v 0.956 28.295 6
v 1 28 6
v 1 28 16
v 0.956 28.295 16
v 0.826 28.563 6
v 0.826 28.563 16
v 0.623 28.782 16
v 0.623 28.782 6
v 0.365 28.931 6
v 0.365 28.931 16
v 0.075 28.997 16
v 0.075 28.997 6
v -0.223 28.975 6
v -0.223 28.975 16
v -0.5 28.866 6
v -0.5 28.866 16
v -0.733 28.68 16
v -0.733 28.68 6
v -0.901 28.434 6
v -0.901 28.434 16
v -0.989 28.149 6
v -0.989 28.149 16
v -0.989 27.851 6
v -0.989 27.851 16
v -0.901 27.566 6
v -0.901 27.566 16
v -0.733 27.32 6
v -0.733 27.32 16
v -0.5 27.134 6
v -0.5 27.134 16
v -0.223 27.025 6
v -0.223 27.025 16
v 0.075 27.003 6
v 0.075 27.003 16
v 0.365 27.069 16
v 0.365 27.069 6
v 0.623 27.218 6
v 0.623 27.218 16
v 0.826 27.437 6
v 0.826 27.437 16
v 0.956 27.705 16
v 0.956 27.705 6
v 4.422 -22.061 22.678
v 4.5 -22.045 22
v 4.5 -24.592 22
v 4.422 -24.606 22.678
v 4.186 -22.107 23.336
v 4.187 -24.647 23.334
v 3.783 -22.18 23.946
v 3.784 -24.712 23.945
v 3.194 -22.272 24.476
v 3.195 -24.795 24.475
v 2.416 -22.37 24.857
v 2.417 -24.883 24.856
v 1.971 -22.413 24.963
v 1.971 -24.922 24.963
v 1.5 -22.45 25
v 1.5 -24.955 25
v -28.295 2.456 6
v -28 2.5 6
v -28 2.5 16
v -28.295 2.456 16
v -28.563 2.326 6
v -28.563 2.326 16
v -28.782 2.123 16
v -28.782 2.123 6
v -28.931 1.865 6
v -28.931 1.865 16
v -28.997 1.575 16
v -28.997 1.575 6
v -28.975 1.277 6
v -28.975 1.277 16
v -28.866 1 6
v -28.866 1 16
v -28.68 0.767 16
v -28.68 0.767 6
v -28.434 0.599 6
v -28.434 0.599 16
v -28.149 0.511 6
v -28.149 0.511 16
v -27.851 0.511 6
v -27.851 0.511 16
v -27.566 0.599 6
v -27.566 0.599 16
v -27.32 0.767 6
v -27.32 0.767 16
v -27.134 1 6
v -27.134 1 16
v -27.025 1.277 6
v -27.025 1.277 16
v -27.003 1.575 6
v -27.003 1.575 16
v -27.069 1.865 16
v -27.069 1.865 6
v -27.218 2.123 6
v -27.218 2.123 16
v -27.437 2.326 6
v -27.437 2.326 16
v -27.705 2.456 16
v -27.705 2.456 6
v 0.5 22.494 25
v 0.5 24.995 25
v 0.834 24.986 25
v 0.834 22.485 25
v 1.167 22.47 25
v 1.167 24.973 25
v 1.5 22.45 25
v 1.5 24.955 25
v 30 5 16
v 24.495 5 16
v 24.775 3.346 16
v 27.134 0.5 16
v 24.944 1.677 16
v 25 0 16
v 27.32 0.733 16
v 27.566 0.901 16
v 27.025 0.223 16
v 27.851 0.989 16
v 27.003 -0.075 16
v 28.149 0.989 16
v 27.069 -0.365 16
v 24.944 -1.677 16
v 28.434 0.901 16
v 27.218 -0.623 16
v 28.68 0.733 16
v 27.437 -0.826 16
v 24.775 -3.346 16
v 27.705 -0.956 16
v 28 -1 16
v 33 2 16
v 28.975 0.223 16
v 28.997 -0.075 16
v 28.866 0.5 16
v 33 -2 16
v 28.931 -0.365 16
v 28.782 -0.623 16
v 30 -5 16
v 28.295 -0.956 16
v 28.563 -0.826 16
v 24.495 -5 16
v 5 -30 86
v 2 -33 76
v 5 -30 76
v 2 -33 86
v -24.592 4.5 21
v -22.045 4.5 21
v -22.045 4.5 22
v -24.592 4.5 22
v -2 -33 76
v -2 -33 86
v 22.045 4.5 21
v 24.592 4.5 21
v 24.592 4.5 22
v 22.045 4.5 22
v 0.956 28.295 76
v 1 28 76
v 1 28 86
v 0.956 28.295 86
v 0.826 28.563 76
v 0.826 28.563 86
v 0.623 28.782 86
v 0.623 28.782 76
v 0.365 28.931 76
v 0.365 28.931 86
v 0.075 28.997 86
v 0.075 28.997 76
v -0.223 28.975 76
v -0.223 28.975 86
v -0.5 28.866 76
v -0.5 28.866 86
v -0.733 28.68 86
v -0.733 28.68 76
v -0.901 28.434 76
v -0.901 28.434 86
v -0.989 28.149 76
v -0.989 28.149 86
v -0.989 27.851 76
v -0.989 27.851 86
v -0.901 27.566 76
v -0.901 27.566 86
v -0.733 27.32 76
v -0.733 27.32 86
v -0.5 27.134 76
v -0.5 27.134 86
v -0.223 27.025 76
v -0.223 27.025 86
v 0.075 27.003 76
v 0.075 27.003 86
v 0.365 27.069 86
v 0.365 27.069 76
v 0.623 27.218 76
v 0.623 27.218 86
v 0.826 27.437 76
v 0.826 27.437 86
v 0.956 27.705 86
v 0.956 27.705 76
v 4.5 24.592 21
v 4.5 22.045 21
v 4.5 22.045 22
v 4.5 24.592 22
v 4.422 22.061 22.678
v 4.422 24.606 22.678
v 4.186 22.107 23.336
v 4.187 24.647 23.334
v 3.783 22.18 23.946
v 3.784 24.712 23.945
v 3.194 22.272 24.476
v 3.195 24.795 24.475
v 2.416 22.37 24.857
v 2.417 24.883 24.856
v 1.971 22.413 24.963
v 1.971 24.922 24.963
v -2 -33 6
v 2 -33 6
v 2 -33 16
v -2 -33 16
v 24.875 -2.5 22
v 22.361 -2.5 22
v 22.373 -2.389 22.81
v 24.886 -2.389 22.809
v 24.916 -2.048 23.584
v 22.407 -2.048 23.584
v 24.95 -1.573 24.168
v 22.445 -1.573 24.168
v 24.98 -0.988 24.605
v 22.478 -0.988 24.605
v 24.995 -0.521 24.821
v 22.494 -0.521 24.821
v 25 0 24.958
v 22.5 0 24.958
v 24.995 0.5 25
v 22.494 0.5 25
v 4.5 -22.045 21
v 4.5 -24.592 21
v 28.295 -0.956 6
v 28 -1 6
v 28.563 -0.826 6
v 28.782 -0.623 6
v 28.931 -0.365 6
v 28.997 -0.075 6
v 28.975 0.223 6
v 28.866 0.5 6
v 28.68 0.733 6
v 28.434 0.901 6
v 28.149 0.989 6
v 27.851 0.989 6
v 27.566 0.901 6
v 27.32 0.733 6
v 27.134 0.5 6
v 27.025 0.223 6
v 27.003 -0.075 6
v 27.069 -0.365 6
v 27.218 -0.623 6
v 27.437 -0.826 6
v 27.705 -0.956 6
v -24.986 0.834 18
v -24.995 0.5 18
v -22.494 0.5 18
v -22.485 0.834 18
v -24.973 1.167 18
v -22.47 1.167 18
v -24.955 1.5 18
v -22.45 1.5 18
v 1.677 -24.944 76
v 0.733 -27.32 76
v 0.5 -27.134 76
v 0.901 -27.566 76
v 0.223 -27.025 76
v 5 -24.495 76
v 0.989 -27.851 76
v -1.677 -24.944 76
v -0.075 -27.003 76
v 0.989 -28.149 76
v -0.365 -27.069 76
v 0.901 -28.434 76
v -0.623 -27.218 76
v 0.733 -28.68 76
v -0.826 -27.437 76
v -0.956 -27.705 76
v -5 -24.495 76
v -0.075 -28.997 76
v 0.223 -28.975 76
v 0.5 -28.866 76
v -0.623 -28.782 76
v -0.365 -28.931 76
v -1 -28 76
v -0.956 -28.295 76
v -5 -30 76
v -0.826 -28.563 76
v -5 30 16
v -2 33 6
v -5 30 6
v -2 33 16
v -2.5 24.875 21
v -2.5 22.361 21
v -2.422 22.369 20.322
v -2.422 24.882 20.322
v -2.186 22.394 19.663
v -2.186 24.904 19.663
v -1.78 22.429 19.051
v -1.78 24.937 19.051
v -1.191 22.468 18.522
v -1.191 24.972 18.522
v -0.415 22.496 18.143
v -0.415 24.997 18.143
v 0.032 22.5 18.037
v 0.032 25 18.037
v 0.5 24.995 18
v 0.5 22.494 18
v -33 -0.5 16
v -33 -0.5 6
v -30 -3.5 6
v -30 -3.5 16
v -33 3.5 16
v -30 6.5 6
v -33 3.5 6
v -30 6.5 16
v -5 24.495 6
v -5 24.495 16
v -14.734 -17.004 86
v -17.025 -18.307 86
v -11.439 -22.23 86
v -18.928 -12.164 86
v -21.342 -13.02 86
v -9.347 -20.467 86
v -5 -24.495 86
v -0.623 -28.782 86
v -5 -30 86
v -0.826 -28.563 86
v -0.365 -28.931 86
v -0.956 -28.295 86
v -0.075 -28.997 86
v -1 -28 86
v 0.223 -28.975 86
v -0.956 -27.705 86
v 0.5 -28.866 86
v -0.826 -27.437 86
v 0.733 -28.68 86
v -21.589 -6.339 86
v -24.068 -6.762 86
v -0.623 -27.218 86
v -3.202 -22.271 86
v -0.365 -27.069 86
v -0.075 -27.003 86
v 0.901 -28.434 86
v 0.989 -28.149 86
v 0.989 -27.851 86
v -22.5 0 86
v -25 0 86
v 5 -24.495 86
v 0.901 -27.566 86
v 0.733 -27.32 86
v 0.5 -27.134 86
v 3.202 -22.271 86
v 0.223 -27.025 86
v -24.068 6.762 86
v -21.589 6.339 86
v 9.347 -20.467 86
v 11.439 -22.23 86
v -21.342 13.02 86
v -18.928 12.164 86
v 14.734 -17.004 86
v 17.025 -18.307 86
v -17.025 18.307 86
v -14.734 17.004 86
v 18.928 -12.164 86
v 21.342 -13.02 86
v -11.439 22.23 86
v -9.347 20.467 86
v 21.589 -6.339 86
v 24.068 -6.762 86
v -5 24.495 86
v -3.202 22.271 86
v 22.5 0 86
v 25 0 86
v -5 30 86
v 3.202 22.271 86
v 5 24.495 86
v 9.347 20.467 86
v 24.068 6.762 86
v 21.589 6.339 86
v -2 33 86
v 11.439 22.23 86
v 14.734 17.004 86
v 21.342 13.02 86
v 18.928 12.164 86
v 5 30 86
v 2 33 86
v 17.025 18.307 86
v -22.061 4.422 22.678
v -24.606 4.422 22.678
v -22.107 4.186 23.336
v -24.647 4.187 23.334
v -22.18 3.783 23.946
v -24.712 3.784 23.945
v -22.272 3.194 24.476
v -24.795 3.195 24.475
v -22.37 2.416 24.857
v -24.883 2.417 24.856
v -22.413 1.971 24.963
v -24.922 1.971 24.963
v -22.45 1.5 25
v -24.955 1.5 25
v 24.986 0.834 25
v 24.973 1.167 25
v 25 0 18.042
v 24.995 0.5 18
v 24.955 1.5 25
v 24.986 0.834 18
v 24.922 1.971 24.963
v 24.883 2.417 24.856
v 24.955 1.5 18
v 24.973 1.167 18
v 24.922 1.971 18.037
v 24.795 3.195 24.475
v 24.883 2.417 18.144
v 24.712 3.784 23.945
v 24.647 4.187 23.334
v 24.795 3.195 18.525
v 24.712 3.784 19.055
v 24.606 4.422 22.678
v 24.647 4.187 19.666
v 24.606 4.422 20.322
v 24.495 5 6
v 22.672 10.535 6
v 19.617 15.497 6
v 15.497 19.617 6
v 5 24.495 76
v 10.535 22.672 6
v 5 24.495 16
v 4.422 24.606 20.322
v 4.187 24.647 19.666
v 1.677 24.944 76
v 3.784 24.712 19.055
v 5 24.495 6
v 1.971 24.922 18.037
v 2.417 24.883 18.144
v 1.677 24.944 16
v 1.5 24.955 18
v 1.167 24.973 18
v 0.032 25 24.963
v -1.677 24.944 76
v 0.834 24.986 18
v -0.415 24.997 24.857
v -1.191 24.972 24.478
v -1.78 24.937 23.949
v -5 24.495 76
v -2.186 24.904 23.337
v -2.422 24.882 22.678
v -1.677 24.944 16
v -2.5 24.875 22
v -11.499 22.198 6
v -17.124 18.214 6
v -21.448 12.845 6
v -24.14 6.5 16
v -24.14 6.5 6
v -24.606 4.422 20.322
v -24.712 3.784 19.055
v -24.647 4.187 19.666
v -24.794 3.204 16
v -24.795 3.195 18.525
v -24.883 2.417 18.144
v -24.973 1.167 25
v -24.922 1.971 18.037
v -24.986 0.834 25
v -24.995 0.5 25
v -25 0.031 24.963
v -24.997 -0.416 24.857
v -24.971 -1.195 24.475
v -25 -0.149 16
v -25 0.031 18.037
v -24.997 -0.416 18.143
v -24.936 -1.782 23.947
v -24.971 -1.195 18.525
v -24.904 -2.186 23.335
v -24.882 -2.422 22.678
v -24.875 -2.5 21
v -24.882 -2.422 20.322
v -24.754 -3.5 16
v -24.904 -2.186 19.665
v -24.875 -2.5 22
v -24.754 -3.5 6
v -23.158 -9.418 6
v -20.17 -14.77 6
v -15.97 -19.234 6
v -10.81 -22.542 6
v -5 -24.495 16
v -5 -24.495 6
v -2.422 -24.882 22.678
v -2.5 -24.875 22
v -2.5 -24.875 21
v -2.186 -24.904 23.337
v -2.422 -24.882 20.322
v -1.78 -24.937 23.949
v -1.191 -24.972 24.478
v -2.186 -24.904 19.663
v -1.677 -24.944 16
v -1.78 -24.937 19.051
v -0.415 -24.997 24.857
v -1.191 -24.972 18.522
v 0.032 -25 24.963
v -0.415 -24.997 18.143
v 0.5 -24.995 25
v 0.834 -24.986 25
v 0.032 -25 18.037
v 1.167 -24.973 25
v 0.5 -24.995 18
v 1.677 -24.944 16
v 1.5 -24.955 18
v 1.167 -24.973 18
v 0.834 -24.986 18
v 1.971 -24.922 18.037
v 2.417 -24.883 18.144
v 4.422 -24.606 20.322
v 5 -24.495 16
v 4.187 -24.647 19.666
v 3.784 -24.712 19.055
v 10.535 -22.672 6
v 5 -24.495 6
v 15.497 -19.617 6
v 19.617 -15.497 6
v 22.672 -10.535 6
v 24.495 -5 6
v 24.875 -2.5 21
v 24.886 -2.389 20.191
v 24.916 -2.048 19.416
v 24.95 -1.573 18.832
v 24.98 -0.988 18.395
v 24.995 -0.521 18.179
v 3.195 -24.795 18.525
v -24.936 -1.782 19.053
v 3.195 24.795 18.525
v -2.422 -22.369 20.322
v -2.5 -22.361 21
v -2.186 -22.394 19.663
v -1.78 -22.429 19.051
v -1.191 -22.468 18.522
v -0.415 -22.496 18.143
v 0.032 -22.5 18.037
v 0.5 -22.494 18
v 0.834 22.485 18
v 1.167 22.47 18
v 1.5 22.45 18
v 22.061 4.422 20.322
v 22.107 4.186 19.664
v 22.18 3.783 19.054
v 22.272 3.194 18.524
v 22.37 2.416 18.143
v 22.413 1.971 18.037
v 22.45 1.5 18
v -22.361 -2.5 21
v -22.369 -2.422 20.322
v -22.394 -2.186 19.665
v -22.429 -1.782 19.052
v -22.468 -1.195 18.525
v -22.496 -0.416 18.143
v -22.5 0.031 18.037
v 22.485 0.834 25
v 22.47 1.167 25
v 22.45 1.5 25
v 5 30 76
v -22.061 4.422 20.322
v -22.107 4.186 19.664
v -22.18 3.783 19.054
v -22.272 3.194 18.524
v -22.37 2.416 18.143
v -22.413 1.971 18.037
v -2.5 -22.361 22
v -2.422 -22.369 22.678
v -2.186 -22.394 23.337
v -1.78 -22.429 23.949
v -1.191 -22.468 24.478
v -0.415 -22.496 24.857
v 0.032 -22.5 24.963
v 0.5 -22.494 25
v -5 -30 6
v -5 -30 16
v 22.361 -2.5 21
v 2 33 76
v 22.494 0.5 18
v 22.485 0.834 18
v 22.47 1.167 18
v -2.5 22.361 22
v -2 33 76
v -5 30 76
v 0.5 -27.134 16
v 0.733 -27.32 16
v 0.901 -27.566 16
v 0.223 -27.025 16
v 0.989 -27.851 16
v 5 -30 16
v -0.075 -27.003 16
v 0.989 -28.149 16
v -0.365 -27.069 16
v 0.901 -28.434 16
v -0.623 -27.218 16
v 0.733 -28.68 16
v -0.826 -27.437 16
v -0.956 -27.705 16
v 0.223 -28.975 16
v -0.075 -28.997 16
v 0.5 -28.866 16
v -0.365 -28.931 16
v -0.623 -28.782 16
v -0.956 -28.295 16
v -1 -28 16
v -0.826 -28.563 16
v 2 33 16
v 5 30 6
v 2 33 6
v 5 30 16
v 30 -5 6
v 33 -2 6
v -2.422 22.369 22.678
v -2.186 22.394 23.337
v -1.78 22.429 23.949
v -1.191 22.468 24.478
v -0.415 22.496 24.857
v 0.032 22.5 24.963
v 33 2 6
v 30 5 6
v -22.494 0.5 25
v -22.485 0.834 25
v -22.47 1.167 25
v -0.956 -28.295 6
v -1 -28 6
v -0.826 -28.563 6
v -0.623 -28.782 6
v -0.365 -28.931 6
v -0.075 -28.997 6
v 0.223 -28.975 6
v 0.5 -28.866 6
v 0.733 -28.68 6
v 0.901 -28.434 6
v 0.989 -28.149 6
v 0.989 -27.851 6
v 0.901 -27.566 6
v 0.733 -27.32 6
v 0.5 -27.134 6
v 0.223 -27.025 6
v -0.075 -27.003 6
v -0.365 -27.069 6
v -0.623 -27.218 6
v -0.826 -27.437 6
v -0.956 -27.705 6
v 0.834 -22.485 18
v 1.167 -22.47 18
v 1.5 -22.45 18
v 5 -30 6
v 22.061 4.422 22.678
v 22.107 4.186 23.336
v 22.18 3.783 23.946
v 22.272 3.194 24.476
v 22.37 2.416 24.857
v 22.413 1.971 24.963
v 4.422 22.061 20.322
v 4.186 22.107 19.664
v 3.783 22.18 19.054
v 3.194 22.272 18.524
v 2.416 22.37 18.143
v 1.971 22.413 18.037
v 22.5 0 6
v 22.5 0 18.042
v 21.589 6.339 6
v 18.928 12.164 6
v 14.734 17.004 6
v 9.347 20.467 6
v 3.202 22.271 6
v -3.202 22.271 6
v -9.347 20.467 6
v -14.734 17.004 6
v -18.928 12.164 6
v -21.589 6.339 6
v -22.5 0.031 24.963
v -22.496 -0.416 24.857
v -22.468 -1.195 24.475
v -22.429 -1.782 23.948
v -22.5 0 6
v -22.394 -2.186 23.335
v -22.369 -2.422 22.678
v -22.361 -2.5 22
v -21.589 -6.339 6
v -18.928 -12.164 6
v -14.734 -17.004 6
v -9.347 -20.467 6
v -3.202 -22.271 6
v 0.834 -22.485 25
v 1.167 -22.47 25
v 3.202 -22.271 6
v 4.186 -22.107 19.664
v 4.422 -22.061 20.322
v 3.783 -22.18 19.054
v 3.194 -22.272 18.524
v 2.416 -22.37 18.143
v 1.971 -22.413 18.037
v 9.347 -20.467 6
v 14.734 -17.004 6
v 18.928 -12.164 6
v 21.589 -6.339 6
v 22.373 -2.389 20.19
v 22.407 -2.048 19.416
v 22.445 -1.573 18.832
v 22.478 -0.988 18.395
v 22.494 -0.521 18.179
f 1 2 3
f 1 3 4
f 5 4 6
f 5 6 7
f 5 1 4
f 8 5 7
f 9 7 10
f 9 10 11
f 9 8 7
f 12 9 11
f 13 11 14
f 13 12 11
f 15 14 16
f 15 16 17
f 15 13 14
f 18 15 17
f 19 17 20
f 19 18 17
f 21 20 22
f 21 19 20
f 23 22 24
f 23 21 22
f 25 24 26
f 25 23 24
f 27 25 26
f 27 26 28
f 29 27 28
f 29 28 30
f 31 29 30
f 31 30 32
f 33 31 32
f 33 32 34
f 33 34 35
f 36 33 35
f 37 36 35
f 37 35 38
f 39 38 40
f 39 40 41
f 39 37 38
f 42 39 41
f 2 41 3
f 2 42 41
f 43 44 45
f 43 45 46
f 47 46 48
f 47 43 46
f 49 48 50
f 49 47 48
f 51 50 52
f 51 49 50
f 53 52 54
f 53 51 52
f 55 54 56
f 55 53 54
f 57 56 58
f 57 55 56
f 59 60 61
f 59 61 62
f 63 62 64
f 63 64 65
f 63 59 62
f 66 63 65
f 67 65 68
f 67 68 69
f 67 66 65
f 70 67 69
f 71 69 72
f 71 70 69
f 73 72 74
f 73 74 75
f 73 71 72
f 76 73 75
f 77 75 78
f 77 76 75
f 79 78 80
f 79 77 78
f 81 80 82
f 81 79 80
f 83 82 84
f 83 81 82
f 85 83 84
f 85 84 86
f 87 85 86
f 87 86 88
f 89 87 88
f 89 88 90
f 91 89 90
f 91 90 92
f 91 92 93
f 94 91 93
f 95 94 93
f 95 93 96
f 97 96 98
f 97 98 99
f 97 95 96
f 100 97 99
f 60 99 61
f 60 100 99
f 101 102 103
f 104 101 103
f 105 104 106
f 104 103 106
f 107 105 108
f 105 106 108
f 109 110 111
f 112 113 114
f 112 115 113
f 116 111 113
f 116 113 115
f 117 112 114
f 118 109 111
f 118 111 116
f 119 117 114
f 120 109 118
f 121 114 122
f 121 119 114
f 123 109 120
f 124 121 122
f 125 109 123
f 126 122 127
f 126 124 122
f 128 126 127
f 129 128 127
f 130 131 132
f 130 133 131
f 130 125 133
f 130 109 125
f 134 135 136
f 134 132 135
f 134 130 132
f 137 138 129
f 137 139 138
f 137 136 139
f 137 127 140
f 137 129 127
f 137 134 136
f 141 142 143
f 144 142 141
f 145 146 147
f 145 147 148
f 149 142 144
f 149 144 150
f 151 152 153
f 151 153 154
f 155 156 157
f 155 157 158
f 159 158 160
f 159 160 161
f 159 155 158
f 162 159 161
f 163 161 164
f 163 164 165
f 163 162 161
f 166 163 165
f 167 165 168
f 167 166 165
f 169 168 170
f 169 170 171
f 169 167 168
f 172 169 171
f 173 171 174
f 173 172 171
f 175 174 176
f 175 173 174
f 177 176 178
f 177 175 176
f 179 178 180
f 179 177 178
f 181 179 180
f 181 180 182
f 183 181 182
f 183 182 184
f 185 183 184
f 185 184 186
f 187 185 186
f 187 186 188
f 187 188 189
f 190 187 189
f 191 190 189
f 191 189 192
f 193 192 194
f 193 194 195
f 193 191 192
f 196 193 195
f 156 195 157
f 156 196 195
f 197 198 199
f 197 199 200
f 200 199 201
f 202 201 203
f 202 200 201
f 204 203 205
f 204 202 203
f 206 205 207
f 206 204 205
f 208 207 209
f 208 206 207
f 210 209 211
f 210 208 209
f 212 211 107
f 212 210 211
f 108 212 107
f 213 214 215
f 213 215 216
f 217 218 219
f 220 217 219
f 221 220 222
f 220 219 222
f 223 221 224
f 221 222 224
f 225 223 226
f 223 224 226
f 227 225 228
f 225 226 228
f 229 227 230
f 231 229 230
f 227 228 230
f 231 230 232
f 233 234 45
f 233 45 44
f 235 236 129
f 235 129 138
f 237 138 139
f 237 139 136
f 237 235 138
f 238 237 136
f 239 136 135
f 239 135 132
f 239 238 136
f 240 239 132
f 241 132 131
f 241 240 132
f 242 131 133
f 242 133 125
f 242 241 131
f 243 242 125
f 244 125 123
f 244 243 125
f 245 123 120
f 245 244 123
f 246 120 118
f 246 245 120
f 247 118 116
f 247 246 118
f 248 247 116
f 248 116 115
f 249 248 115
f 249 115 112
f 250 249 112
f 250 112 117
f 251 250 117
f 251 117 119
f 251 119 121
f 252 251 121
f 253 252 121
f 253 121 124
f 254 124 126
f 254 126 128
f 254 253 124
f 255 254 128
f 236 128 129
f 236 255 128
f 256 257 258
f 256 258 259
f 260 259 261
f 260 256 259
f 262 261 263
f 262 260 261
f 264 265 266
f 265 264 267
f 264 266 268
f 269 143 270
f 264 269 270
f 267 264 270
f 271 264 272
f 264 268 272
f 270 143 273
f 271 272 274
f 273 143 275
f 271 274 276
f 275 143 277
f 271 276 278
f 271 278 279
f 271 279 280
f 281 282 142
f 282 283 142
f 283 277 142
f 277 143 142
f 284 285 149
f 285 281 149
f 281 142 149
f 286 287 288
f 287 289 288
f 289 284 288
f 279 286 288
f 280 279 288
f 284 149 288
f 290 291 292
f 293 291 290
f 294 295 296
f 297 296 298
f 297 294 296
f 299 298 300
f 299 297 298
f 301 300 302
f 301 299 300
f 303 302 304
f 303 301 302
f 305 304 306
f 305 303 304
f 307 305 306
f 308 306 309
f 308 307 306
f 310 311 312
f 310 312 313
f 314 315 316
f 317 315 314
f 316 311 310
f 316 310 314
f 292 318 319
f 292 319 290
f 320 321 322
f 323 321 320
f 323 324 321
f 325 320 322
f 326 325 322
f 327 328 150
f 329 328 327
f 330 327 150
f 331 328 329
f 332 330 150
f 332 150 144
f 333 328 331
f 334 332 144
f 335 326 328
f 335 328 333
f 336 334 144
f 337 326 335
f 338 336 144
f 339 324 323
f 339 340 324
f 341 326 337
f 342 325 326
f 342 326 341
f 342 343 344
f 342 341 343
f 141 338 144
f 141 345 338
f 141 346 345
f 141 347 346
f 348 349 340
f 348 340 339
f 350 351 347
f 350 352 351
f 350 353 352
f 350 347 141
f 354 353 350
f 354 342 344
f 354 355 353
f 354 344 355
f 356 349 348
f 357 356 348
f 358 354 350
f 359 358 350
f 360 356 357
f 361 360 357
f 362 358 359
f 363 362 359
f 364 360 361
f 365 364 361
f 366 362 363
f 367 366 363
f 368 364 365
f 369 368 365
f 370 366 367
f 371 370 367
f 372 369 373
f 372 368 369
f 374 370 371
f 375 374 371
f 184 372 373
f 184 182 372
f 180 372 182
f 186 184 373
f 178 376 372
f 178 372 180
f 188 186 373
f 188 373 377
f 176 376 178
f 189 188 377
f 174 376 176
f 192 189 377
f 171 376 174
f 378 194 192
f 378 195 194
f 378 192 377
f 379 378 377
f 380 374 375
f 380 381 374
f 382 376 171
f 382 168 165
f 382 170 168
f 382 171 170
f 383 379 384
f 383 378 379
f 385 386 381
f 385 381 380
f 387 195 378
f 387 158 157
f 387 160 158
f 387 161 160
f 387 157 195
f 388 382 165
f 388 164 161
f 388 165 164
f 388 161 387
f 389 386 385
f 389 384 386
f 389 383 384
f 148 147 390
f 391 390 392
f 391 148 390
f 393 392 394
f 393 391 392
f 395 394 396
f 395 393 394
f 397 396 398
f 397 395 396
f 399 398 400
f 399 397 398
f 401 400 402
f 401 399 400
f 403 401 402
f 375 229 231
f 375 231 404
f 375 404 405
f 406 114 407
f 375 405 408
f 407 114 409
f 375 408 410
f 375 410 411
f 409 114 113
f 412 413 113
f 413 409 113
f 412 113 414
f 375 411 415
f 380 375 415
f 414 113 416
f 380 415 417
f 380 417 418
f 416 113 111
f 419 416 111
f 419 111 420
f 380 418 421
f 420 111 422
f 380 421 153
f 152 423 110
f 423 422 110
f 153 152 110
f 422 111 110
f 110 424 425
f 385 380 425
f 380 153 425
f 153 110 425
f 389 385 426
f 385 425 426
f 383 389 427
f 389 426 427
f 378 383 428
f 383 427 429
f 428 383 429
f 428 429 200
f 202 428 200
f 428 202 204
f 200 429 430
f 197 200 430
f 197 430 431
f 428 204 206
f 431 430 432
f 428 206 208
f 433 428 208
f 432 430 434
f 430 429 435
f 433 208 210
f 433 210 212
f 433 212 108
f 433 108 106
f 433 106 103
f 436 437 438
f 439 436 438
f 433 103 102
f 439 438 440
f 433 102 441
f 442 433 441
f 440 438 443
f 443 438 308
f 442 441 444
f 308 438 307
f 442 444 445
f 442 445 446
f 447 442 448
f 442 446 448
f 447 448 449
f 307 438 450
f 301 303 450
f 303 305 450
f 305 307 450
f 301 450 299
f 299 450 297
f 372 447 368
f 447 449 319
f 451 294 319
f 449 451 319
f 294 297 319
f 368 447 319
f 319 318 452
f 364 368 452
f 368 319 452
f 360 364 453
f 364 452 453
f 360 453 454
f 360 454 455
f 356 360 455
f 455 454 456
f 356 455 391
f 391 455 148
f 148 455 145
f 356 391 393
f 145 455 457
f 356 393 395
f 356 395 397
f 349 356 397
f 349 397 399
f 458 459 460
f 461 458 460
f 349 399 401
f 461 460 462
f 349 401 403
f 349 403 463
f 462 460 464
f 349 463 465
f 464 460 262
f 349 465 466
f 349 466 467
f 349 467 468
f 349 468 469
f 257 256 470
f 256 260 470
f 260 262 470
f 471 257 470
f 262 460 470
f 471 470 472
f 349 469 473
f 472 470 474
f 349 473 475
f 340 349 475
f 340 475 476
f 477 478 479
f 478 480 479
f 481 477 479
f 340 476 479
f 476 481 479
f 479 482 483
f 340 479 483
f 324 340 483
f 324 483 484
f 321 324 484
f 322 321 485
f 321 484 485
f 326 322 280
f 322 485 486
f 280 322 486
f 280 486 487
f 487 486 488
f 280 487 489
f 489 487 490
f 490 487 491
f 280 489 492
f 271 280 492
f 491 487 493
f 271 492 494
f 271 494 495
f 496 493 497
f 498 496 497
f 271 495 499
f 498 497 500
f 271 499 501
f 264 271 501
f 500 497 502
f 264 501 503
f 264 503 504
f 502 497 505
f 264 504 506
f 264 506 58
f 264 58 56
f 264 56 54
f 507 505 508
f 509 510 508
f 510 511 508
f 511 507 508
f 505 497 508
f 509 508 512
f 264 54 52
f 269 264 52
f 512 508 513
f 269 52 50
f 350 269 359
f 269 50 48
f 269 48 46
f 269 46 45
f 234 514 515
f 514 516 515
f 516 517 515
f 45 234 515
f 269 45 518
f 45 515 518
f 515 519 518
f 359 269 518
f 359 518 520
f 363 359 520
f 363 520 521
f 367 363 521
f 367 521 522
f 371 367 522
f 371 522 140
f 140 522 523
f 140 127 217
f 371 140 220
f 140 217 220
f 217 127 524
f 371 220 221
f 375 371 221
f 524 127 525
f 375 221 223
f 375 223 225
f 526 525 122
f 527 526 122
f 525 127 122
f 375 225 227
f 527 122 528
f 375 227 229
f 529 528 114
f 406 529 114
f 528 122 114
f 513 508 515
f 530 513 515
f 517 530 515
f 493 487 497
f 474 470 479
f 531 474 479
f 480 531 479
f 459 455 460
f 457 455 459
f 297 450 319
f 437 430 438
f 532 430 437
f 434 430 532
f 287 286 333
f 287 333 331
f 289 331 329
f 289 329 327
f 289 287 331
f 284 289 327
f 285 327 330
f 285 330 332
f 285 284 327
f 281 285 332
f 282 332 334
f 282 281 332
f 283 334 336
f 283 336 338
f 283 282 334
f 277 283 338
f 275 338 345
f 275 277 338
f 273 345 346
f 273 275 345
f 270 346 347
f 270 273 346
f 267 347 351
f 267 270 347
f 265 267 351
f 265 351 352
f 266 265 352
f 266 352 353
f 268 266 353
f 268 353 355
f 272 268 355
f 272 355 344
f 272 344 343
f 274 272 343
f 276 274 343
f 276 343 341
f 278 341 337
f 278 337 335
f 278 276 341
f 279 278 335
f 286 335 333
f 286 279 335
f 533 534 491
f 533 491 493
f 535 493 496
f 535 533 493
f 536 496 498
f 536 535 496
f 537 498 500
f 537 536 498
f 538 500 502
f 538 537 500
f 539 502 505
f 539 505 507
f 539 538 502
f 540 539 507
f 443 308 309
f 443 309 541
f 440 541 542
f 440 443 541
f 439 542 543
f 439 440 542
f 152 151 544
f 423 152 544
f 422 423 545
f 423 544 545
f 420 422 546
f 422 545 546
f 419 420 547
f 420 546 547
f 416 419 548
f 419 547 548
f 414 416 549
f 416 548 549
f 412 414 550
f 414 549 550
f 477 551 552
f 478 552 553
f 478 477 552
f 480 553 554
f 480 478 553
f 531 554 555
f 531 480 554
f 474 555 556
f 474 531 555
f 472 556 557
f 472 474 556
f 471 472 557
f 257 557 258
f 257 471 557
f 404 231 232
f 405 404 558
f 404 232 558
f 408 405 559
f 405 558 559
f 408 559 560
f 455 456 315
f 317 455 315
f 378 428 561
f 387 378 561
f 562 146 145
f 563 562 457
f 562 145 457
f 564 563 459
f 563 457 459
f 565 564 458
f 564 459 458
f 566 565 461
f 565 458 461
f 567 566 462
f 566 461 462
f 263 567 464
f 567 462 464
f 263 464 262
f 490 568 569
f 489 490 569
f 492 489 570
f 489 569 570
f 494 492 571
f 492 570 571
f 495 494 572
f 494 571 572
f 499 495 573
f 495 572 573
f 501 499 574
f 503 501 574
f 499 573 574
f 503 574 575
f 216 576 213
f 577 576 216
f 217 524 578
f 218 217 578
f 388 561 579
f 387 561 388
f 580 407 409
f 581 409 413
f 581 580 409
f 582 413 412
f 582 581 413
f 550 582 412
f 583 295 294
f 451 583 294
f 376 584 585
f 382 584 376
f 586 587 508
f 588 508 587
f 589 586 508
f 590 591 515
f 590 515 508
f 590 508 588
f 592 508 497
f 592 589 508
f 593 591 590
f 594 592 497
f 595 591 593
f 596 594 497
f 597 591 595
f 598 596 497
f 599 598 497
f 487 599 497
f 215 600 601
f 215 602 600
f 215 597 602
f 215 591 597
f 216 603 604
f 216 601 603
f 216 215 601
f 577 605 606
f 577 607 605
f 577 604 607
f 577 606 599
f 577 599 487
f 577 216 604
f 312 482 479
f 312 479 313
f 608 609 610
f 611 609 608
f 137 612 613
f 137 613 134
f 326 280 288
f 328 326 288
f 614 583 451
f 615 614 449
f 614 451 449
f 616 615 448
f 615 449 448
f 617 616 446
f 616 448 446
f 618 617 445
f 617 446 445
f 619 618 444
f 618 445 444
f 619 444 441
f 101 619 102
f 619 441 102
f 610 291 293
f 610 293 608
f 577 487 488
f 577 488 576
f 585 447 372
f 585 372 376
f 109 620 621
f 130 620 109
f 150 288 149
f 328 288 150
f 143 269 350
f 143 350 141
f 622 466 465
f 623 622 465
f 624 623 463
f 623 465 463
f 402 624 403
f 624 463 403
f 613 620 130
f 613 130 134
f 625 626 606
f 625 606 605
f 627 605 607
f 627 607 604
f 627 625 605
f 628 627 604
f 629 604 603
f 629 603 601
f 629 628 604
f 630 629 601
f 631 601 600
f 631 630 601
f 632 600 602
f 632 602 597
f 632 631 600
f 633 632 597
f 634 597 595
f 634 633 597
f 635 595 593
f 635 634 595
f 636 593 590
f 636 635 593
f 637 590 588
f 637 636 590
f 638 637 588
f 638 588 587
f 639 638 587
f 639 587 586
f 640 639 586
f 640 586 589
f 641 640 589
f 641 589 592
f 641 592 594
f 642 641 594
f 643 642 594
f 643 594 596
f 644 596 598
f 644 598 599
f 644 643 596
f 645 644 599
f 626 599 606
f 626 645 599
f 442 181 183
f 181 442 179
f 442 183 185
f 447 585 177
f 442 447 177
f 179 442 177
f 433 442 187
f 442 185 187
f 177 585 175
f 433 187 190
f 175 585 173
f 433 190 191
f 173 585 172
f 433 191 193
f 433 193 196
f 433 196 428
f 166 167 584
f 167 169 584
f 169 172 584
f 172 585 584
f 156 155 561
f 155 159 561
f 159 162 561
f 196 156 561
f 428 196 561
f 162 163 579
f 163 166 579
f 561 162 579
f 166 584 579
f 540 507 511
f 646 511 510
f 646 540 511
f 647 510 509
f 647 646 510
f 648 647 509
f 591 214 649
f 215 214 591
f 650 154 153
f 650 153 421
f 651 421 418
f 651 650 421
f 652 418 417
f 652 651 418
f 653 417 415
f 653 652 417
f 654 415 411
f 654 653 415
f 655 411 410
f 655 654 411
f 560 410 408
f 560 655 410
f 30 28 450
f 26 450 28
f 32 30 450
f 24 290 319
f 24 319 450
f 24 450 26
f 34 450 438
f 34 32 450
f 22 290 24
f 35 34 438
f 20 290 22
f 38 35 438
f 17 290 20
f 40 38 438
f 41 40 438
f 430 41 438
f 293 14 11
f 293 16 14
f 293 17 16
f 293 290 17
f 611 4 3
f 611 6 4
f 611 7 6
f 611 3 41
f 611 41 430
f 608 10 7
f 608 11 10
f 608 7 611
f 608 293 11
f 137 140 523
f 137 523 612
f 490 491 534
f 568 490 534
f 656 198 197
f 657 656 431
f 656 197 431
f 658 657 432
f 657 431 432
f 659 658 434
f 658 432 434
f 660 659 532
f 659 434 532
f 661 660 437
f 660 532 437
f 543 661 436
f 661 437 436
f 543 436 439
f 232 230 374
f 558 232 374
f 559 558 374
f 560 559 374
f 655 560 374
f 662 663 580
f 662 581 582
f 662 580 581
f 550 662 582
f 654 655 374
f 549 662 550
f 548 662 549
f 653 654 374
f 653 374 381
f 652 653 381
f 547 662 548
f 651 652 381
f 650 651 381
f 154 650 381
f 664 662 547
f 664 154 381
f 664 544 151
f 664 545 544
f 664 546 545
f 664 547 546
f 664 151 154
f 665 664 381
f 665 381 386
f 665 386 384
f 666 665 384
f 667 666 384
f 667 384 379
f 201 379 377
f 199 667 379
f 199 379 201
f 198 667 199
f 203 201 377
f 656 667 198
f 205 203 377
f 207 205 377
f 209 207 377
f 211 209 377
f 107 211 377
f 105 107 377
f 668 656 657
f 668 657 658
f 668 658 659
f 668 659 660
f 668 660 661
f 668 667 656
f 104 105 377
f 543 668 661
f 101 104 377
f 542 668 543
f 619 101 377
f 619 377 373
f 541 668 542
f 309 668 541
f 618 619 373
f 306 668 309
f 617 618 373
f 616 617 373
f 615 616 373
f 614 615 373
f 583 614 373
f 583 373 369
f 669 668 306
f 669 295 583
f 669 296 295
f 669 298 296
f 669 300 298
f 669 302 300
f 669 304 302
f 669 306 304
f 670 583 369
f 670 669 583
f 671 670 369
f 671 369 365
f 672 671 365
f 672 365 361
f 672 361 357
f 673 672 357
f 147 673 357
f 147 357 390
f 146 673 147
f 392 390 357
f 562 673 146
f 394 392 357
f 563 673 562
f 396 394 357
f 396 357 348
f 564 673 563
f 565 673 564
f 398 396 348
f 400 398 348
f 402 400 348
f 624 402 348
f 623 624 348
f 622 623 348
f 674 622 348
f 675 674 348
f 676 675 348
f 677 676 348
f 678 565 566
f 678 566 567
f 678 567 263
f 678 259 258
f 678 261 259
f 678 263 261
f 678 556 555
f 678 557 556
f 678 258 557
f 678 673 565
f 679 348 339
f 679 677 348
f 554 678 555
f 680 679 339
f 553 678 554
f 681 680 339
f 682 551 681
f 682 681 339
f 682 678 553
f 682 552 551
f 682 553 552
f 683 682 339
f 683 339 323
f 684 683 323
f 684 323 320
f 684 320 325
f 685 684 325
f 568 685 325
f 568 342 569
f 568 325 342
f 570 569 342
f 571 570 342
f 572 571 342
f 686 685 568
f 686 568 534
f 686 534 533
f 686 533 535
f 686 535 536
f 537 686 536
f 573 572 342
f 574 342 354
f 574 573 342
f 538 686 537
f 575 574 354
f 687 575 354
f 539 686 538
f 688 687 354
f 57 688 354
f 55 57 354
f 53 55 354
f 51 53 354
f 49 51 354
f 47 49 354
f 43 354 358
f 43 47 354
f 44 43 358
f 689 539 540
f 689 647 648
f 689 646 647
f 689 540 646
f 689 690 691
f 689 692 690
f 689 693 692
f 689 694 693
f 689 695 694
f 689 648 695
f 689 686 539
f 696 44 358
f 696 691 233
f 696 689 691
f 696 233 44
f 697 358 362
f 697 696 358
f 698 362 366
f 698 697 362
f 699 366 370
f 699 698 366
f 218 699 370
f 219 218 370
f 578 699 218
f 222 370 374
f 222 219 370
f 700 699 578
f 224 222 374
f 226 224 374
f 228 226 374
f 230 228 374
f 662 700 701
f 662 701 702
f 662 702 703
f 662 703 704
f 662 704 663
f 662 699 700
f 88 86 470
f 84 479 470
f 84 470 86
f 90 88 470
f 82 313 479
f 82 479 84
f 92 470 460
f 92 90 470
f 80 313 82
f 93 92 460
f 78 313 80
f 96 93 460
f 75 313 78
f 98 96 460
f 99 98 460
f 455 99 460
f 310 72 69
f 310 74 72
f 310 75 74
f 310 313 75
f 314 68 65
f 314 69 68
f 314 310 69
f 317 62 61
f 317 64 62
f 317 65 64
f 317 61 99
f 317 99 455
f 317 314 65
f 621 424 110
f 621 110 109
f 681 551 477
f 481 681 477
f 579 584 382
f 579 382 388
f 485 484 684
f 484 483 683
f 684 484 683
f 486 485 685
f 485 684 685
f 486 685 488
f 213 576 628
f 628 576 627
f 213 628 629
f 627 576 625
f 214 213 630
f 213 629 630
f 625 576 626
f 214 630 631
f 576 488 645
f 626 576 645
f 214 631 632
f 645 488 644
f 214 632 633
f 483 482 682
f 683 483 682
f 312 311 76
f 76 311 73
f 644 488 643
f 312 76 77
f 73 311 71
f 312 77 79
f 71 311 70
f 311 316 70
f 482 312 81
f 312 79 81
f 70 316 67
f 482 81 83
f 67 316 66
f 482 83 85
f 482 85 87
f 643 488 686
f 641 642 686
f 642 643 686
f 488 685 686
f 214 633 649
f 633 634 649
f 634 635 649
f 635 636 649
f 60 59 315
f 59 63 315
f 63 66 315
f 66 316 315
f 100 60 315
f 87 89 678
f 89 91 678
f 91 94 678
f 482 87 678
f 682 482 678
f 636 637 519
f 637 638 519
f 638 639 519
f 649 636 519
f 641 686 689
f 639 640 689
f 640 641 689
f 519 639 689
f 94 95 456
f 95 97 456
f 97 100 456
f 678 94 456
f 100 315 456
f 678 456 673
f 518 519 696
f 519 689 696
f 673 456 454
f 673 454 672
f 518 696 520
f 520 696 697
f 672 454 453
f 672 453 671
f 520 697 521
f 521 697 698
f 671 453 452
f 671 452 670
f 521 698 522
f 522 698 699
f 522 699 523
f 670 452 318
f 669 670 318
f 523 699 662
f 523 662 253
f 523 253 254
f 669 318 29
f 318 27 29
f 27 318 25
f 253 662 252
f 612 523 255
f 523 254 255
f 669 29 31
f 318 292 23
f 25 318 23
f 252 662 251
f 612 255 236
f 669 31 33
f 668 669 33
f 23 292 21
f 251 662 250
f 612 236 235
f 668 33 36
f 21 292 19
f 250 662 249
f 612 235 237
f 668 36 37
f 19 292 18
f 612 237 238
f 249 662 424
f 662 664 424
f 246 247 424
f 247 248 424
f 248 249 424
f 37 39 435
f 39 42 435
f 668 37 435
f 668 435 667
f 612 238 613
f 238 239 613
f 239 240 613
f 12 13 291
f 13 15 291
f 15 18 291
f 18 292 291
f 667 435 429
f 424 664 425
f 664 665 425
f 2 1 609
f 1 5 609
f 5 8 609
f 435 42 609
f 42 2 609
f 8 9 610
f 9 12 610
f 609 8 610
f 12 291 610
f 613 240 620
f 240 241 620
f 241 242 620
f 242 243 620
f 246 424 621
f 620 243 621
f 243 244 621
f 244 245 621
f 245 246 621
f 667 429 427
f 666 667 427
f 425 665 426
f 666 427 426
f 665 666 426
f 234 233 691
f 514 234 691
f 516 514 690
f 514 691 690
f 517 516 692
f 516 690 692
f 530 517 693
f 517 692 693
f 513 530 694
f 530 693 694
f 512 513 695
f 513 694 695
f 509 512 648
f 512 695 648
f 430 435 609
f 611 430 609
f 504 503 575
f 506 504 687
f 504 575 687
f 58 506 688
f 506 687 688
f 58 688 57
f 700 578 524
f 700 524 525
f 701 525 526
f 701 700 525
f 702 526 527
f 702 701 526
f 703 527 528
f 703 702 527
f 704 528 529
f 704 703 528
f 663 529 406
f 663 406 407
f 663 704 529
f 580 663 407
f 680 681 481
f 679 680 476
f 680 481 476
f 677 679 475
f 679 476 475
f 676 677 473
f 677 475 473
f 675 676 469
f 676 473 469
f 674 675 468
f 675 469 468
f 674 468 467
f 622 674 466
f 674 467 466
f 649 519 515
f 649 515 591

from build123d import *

# Parameters (mm, degrees)
CYLINDER019_R              = 1
CYLINDER019_DEPTH          = 10
BOX007_W                   = 10
BOX007_H                   = 10
BOX007_DEPTH               = 10
CHAMFER004_SIZE            = 3
CHAMFER004_PLACEMENT_ANGLE = -90
CYLINDER015_R              = 1
CYLINDER015_DEPTH          = 10
BOX002_W                   = 10
BOX002_H                   = 10
BOX002_DEPTH               = 10
CHAMFER_SIZE               = 3
CYLINDER017_R              = 1
CYLINDER017_DEPTH          = 10
BOX005_W                   = 10
BOX005_H                   = 10
BOX005_DEPTH               = 10
CHAMFER002_SIZE            = 3
CYLINDER018_R              = 1
CYLINDER018_DEPTH          = 10
BOX006_W                   = 10
BOX006_H                   = 10
BOX006_DEPTH               = 10
CHAMFER003_SIZE            = 3
CHAMFER003_PLACEMENT_ANGLE = 90
CYLINDER020_R              = 1
CYLINDER020_DEPTH          = 10
BOX008_W                   = 10
BOX008_H                   = 10
BOX008_DEPTH               = 10
CHAMFER005_SIZE            = 3
CHAMFER005_PLACEMENT_ANGLE = 180
CYLINDER_R                 = 1
CYLINDER_DEPTH             = 10
BOX004_W                   = 10
BOX004_H                   = 10
BOX004_DEPTH               = 10
CHAMFER001_SIZE            = 3
CHAMFER001_PLACEMENT_ANGLE = 180
BOX001_W                   = 7
BOX001_H                   = 120
BOX001_DEPTH               = 7
BOX001_PLACEMENT_ANGLE     = 90
FILLET_R                   = 3
BOX_W                      = 7
BOX_H                      = 120
BOX_DEPTH                  = 7
FILLET001_R                = 3
CYLINDER009_R              = 22.5
CYLINDER009_DEPTH          = 80
CYLINDER008_R              = 25
CYLINDER008_DEPTH          = 80


with BuildPart() as cylindre020:
    # Cylinder019 → Cylinder019 (new body)
    with BuildSketch(Plane(origin=(5, 5, 0), x_dir=(1, 0, 0), z_dir=(0, 0, 1))):
        Circle(CYLINDER019_R)
    extrude(amount=CYLINDER019_DEPTH)


with BuildPart() as chamfer004:
    # Box007 → Box007 (new body)
    with BuildSketch(Plane.XY):
        with Locations((5, 5)):
            Rectangle(BOX007_W, BOX007_H)
    extrude(amount=BOX007_DEPTH)

    # Cut018: cut Cylindre020
    add(cylindre020.part, mode=Mode.SUBTRACT)


with BuildPart() as chamfer004_1:
    # Cut018 placement: moved
    add(chamfer004.part.moved(Location((-5, 48, 70))))

    # Chamfer004
    chamfer004_edges = [chamfer004_1.edges().sort_by_distance(p)[0] for p in [
        (-5, 58, 75),
        (5, 58, 75),
    ]]
    chamfer(chamfer004_edges, length=CHAMFER004_SIZE)


with BuildPart() as chamfer004_2:
    # Chamfer004 placement: moved
    add(chamfer004_1.part.moved(Location((-25, 0, -70))).rotate(Axis((-25, 0, -70), (0, 0, 1)), CHAMFER004_PLACEMENT_ANGLE))


with BuildPart() as cylindre:
    # Cylinder015 → Cylinder015 (new body)
    with BuildSketch(Plane(origin=(5, 5, 0), x_dir=(1, 0, 0), z_dir=(0, 0, 1))):
        Circle(CYLINDER015_R)
    extrude(amount=CYLINDER015_DEPTH)


with BuildPart() as chamfer_body:
    # Box002 → Box002 (new body)
    with BuildSketch(Plane.XY):
        with Locations((5, 5)):
            Rectangle(BOX002_W, BOX002_H)
    extrude(amount=BOX002_DEPTH)

    # Cut014: cut Cylindre
    add(cylindre.part, mode=Mode.SUBTRACT)


with BuildPart() as chamfer_body_1:
    # Cut014 placement: moved
    add(chamfer_body.part.moved(Location((-5, 48, 70))))

    # Chamfer
    chamfer_edges = [chamfer_body_1.edges().sort_by_distance(p)[0] for p in [
        (-5, 58, 75),
        (5, 58, 75),
    ]]
    chamfer(chamfer_edges, length=CHAMFER_SIZE)


with BuildPart() as chamfer_body_2:
    # Chamfer placement: moved
    add(chamfer_body_1.part.moved(Location((0, -25, 0))))


with BuildPart() as cylindre018:
    # Cylinder017 → Cylinder017 (new body)
    with BuildSketch(Plane(origin=(5, 5, 0), x_dir=(1, 0, 0), z_dir=(0, 0, 1))):
        Circle(CYLINDER017_R)
    extrude(amount=CYLINDER017_DEPTH)


with BuildPart() as chamfer002:
    # Box005 → Box005 (new body)
    with BuildSketch(Plane.XY):
        with Locations((5, 5)):
            Rectangle(BOX005_W, BOX005_H)
    extrude(amount=BOX005_DEPTH)

    # Cut016: cut Cylindre018
    add(cylindre018.part, mode=Mode.SUBTRACT)


with BuildPart() as chamfer002_1:
    # Cut016 placement: moved
    add(chamfer002.part.moved(Location((-5, 48, 70))))

    # Chamfer002
    chamfer002_edges = [chamfer002_1.edges().sort_by_distance(p)[0] for p in [
        (-5, 58, 75),
        (5, 58, 75),
    ]]
    chamfer(chamfer002_edges, length=CHAMFER002_SIZE)


with BuildPart() as chamfer002_2:
    # Chamfer002 placement: moved
    add(chamfer002_1.part.moved(Location((0, -25, -70))))


with BuildPart() as cylindre019:
    # Cylinder018 → Cylinder018 (new body)
    with BuildSketch(Plane(origin=(5, 5, 0), x_dir=(1, 0, 0), z_dir=(0, 0, 1))):
        Circle(CYLINDER018_R)
    extrude(amount=CYLINDER018_DEPTH)


with BuildPart() as chamfer003:
    # Box006 → Box006 (new body)
    with BuildSketch(Plane.XY):
        with Locations((5, 5)):
            Rectangle(BOX006_W, BOX006_H)
    extrude(amount=BOX006_DEPTH)

    # Cut017: cut Cylindre019
    add(cylindre019.part, mode=Mode.SUBTRACT)


with BuildPart() as chamfer003_1:
    # Cut017 placement: moved
    add(chamfer003.part.moved(Location((-5, 48, 70))))

    # Chamfer003
    chamfer003_edges = [chamfer003_1.edges().sort_by_distance(p)[0] for p in [
        (-5, 58, 75),
        (5, 58, 75),
    ]]
    chamfer(chamfer003_edges, length=CHAMFER003_SIZE)


with BuildPart() as chamfer003_2:
    # Chamfer003 placement: moved
    add(chamfer003_1.part.moved(Location((25, 1.5, -70))).rotate(Axis((25, 1.5, -70), (0, 0, 1)), CHAMFER003_PLACEMENT_ANGLE))


with BuildPart() as cylindre021:
    # Cylinder020 → Cylinder020 (new body)
    with BuildSketch(Plane(origin=(5, 5, 0), x_dir=(1, 0, 0), z_dir=(0, 0, 1))):
        Circle(CYLINDER020_R)
    extrude(amount=CYLINDER020_DEPTH)


with BuildPart() as chamfer005:
    # Box008 → Box008 (new body)
    with BuildSketch(Plane.XY):
        with Locations((5, 5)):
            Rectangle(BOX008_W, BOX008_H)
    extrude(amount=BOX008_DEPTH)

    # Cut019: cut Cylindre021
    add(cylindre021.part, mode=Mode.SUBTRACT)


with BuildPart() as chamfer005_1:
    # Cut019 placement: moved
    add(chamfer005.part.moved(Location((-5, 48, 70))))

    # Chamfer005
    chamfer005_edges = [chamfer005_1.edges().sort_by_distance(p)[0] for p in [
        (-5, 58, 75),
        (5, 58, 75),
    ]]
    chamfer(chamfer005_edges, length=CHAMFER005_SIZE)


with BuildPart() as chamfer005_2:
    # Chamfer005 placement: moved
    add(chamfer005_1.part.moved(Location((0, 25, -70))).rotate(Axis((0, 25, -70), (0, 0, 1)), CHAMFER005_PLACEMENT_ANGLE))


with BuildPart() as cylindre017:
    # Cylinder → Cylinder (new body)
    with BuildSketch(Plane(origin=(5, 5, 0), x_dir=(1, 0, 0), z_dir=(0, 0, 1))):
        Circle(CYLINDER_R)
    extrude(amount=CYLINDER_DEPTH)


with BuildPart() as visses:
    # Box004 → Box004 (new body)
    with BuildSketch(Plane.XY):
        with Locations((5, 5)):
            Rectangle(BOX004_W, BOX004_H)
    extrude(amount=BOX004_DEPTH)

    # Cut015: cut Cylindre017
    add(cylindre017.part, mode=Mode.SUBTRACT)


with BuildPart() as visses_1:
    # Cut015 placement: moved
    add(visses.part.moved(Location((-5, 48, 70))))

    # Chamfer001
    chamfer001_edges = [visses_1.edges().sort_by_distance(p)[0] for p in [
        (-5, 58, 75),
        (5, 58, 75),
    ]]
    chamfer(chamfer001_edges, length=CHAMFER001_SIZE)


with BuildPart() as visses_2:
    # Chamfer001 placement: moved
    add(visses_1.part.moved(Location((0, 25, 0))).rotate(Axis((0, 25, 0), (0, 0, 1)), CHAMFER001_PLACEMENT_ANGLE))

    # Fusion: union Chamfer004, Chamfer body, Chamfer002, Chamfer003, Chamfer005
    add(chamfer004_2.part)
    add(chamfer_body_2.part)
    add(chamfer002_2.part)
    add(chamfer003_2.part)
    add(chamfer005_2.part)


with BuildPart() as fillet_body:
    # Box001 → Box001 (new body)
    with BuildSketch(Plane.XY):
        with Locations((3.5, 60)):
            Rectangle(BOX001_W, BOX001_H)
    extrude(amount=BOX001_DEPTH)


with BuildPart() as fillet_body_1:
    # Box001 placement: moved
    add(fillet_body.part.moved(Location((60, -2.5, 12))).rotate(Axis((60, -2.5, 12), (0, 0, 1)), BOX001_PLACEMENT_ANGLE))

    # Fillet
    fillet_edges = [fillet_body_1.edges().sort_by_distance(p)[0] for p in [
        (0, -2.5, 19),
        (0, -2.5, 12),
        (0, 4.5, 19),
        (0, 4.5, 12),
    ]]
    fillet(fillet_edges, radius=FILLET_R)


with BuildPart() as fillet001:
    # Box → Box (new body)
    with BuildSketch(Plane(origin=(-2.5, -60, 12), x_dir=(1, 0, 0), z_dir=(0, 0, 1))):
        with Locations((3.5, 60)):
            Rectangle(BOX_W, BOX_H)
    extrude(amount=BOX_DEPTH)

    # Fillet001
    fillet001_edges = [fillet001.edges().sort_by_distance(p)[0] for p in [
        (-2.5, 0, 19),
        (-2.5, 0, 12),
        (4.5, 0, 19),
        (4.5, 0, 12),
    ]]
    fillet(fillet001_edges, radius=FILLET001_R)


with BuildPart() as cylindre009:
    # Cylinder009 → Cylinder009 (new body)
    with BuildSketch(Plane.XY):
        Circle(CYLINDER009_R)
    extrude(amount=CYLINDER009_DEPTH)


with BuildPart() as propulseur:
    # Cylinder008 → Cylinder008 (new body)
    with BuildSketch(Plane.XY):
        Circle(CYLINDER008_R)
    extrude(amount=CYLINDER008_DEPTH)

    # Cut008: cut Cylindre009
    add(cylindre009.part, mode=Mode.SUBTRACT)

    # Cut: cut Fillet001
    add(fillet001.part, mode=Mode.SUBTRACT)

    # Cut009: cut Fillet body
    add(fillet_body_1.part, mode=Mode.SUBTRACT)

    # Fusion001: union visses
    add(visses_2.part)


with BuildPart() as propulseur_1:
    # Fusion001 placement: moved
    add(propulseur.part.moved(Location((0, 0, 6))))


solid = propulseur_1.part
